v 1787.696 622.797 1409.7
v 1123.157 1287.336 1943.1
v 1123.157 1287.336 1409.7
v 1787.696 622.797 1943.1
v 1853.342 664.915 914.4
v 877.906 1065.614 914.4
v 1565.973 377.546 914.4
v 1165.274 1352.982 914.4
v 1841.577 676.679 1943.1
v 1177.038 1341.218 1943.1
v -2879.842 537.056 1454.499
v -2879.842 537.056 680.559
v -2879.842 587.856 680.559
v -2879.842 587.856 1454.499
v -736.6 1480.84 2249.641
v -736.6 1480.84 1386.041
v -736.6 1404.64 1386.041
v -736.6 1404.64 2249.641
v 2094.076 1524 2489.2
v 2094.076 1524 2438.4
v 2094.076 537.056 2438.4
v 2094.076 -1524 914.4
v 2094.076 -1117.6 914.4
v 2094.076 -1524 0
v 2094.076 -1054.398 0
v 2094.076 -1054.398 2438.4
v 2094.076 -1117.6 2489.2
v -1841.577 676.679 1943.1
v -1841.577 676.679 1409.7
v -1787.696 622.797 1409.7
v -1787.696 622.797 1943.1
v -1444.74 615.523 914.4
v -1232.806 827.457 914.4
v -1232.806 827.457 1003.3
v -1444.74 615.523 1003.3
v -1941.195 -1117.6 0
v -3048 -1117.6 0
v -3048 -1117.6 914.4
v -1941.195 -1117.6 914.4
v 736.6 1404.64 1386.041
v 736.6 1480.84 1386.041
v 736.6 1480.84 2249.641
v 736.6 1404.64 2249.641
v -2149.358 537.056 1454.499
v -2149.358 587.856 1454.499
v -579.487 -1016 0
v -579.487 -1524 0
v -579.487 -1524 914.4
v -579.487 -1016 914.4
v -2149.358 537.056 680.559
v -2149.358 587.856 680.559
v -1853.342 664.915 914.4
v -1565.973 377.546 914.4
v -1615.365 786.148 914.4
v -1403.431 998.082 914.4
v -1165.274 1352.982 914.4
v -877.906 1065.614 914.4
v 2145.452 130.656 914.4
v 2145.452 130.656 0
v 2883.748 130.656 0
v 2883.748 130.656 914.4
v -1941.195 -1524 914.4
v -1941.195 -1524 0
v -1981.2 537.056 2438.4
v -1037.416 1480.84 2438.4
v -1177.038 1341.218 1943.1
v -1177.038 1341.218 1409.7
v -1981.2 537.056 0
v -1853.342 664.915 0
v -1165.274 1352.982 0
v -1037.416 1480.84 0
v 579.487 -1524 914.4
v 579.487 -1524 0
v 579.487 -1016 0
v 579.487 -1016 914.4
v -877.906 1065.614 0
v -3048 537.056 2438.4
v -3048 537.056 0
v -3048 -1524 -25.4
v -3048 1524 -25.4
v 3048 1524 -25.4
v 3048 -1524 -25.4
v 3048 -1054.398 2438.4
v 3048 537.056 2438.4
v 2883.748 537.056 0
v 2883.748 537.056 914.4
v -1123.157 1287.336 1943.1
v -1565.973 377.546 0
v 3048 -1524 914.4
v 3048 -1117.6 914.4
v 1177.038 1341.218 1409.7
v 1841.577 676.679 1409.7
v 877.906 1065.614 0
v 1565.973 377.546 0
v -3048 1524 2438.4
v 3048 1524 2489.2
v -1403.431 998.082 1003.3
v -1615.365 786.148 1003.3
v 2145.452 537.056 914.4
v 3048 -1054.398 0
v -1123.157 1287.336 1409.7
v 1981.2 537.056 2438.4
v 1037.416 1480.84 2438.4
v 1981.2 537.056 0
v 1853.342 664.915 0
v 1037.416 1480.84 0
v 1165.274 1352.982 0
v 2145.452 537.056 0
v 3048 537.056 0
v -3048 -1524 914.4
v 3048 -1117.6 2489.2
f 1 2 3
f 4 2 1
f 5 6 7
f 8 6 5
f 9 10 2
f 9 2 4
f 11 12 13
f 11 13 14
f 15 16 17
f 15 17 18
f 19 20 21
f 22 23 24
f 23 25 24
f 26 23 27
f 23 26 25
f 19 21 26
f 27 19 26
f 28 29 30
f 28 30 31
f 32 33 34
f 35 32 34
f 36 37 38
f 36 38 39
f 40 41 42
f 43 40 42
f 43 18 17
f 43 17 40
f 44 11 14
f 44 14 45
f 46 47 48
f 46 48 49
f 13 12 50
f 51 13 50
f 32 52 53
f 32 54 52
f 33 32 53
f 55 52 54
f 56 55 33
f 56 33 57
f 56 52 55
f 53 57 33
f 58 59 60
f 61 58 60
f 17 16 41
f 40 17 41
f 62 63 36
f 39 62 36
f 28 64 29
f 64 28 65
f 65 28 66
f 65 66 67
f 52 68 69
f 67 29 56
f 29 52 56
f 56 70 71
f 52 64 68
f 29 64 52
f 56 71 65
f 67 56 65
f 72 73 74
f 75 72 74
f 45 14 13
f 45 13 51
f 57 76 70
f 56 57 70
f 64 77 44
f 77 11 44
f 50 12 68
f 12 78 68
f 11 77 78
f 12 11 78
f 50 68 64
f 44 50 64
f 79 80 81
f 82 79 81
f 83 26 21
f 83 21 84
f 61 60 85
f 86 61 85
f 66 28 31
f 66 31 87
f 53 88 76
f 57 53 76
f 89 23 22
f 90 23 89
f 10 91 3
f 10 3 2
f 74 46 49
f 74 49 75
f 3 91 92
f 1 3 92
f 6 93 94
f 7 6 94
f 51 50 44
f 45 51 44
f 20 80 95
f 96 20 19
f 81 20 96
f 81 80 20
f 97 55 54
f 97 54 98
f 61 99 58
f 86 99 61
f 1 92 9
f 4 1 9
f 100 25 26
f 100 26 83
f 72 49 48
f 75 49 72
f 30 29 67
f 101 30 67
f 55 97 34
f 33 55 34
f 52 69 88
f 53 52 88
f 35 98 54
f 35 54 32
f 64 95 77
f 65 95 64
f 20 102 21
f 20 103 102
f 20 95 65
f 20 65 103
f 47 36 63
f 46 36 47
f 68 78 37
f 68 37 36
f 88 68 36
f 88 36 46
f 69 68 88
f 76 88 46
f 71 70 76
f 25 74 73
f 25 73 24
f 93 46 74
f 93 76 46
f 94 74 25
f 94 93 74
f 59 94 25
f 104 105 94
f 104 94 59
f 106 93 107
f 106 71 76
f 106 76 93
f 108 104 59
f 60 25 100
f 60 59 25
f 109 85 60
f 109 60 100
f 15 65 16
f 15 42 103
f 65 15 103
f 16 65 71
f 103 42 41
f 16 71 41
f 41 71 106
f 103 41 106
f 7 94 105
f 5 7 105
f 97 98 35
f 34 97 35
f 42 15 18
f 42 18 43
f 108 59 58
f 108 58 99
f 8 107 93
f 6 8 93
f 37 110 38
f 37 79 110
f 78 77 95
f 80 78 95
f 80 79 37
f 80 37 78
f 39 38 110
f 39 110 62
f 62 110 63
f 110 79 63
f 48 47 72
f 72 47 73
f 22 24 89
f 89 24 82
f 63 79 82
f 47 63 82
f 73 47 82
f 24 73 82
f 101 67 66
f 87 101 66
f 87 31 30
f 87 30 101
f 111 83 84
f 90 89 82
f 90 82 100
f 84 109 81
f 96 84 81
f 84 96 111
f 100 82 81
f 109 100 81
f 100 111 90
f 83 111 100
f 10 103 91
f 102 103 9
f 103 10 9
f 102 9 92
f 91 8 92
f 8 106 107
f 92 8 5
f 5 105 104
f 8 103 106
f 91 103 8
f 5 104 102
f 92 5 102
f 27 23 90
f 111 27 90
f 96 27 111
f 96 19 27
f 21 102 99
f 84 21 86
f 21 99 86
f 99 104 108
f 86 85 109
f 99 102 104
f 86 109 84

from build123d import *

# Parameters (mm, degrees)
F2_DEPTH  = 2438.4
F1_W      = 953.9242294849
F1_H      = 63.2018825702
F1_W_2    = 1158.9735746384
F1_H_2    = 508
F3_DEPTH  = 914.4
F1_W_3    = 738.2956321716
F1_H_3    = 406.4
F0_W      = 6096
F0_H      = 3048
F4_DEPTH  = 25.4
F5_W      = 953.9242294849
F5_H      = 1654.6562362949
F5_H_2    = 986.9437637051
F6_DEPTH  = 50.8
F7_W      = 1473.2
F7_H      = 863.6
F8_DEPTH  = 76.2
F9_W      = 939.8
F9_H      = 533.4
F11_DEPTH = 76.2
F10_W     = 939.8
F10_H     = 533.4
F12_DEPTH = 76.2
F13_W     = 730.4839317322
F13_H     = 773.9401051014
F14_DEPTH = 50.8
F16_START = -254
F15_W     = 241.3
F15_H     = 88.9
F16_DEPTH = 299.72
F17_W     = 1106.8047355545
F17_H     = 406.4
F18_DEPTH = 914.4


with BuildPart() as f2:
    # F1 (on face) → F2 (new body)
    with BuildSketch(Plane.XY):
        Polygon((3048, 537.0562362949), (3048, 1524), (-3048, 1524), (-3048, 537.0562362949), (-1981.2, 537.0562362949), (-1853.3416025037, 664.9146337911), (-1165.2743124712, 1352.9819238236), (-1037.415914975, 1480.8403213199), (1037.415914975, 1480.8403213199), (1165.2743124712, 1352.9819238236), (1853.3416025037, 664.9146337911), (1981.2, 537.0562362949), (2145.4521839142, 537.0562362949), (2883.7478160858, 537.0562362949), align=None)
    extrude(amount=F2_DEPTH)

    # F1 (on face) → F3, piece 2 (join)
    with BuildSketch(Plane.XY):
        Polygon((-1165.2743124712, 1352.9819238236), (-1853.3416025037, 664.9146337911), (-1565.9734066295, 377.5464379169), (-877.906116597, 1065.6137279494), align=None)
        Polygon((1565.9734066295, 377.5464379169), (1853.3416025037, 664.9146337911), (1165.2743124712, 1352.9819238236), (877.906116597, 1065.6137279494), align=None)
        with Locations((2514.6, 333.8562362949)):
            Rectangle(F1_W_3, F1_H_3)
    extrude(amount=F3_DEPTH)



with BuildPart() as f2b:
    # F1 (on face) → F2, piece 2 (new body)
    with BuildSketch(Plane.XY):
        with Locations((2571.0378852575, -1085.9990587149)):
            Rectangle(F1_W, F1_H)
    extrude(amount=F2_DEPTH)

    # F1 (on face) → F3, piece 3 (join)
    with BuildSketch(Plane.XY):
        with Locations((2571.0378852575, -1320.8)):
            Rectangle(F1_W, F1_H_3)
    extrude(amount=F3_DEPTH)


with BuildPart() as f3:
    # F1 (on face) → F3 (new body)
    with BuildSketch(Plane.XY):
        with Locations((0, -1270)):
            Rectangle(F1_W_2, F1_H_2)
    extrude(amount=F3_DEPTH)


with BuildPart() as f2_1:
    add(f2.part)

    add(f2b.part)  # F4 merges F2b

    add(f3.part)  # F4 merges F3
    # F0 (on Top) → F4 (join)
    with BuildSketch(Plane.XY):
        Rectangle(F0_W, F0_H)
    extrude(amount=-F4_DEPTH)

    # F5 (on face) → F6 (join)
    with BuildSketch(Plane.XY.offset(2438.4)):
        with Locations((2571.0378852575, -290.2718818526)):
            Rectangle(F5_W, F5_H)
        with Locations((2571.0378852575, 1030.5281181474)):
            Rectangle(F5_W, F5_H_2)
    extrude(amount=F6_DEPTH)

    # F7 (on face) → F8 (join)
    with BuildSketch(Plane.XZ.offset(-1480.8403213199)):
        with Locations((0, 1817.8412914276)):
            Rectangle(F7_W, F7_H)
    extrude(amount=F8_DEPTH)

    # F9 (on face) → F11 (join)
    with BuildSketch(Plane(origin=(-1259.1281181474, 1259.1281181474, 0), x_dir=(0.7071067812, 0.7071067812, 0), z_dir=(0.7071067812, -0.7071067812, 0))):
        with Locations((-353.807721827, 1676.4)):
            Rectangle(F9_W, F9_H)
    extrude(amount=F11_DEPTH)

    # F10 (on face) → F12 (join)
    with BuildSketch(Plane(origin=(1259.1281181474, 1259.1281181474, 0), x_dir=(0.7071067812, -0.7071067812, 0), z_dir=(-0.7071067812, -0.7071067812, 0))):
        with Locations((353.807721827, 1676.4)):
            Rectangle(F10_W, F10_H)
    extrude(amount=F12_DEPTH)

    # F13 (on face) → F14 (cut)
    with BuildSketch(Plane.XZ.offset(-537.0562362949)):
        with Locations((-2514.6, 1067.5287936434)):
            Rectangle(F13_W, F13_H)
    extrude(amount=-F14_DEPTH, mode=Mode.SUBTRACT)

    # F15 (on face) → F16 (join)
    with BuildSketch(Plane(origin=(-594.2134843563, -594.2134843563, 0), x_dir=(0.7071067812, -0.7071067812, 0), z_dir=(-0.7071067812, -0.7071067812, 0)).offset(F16_START)):
        with Locations((-1577.4760614494, 958.85)):
            Rectangle(F15_W, F15_H)
    extrude(amount=-F16_DEPTH)

    # F17 (on face) → F18 (join)
    with BuildSketch(Plane.XY):
        with Locations((-2494.5976322227, -1320.8)):
            Rectangle(F17_W, F17_H)
    extrude(amount=F18_DEPTH)


solid = f2_1.part
